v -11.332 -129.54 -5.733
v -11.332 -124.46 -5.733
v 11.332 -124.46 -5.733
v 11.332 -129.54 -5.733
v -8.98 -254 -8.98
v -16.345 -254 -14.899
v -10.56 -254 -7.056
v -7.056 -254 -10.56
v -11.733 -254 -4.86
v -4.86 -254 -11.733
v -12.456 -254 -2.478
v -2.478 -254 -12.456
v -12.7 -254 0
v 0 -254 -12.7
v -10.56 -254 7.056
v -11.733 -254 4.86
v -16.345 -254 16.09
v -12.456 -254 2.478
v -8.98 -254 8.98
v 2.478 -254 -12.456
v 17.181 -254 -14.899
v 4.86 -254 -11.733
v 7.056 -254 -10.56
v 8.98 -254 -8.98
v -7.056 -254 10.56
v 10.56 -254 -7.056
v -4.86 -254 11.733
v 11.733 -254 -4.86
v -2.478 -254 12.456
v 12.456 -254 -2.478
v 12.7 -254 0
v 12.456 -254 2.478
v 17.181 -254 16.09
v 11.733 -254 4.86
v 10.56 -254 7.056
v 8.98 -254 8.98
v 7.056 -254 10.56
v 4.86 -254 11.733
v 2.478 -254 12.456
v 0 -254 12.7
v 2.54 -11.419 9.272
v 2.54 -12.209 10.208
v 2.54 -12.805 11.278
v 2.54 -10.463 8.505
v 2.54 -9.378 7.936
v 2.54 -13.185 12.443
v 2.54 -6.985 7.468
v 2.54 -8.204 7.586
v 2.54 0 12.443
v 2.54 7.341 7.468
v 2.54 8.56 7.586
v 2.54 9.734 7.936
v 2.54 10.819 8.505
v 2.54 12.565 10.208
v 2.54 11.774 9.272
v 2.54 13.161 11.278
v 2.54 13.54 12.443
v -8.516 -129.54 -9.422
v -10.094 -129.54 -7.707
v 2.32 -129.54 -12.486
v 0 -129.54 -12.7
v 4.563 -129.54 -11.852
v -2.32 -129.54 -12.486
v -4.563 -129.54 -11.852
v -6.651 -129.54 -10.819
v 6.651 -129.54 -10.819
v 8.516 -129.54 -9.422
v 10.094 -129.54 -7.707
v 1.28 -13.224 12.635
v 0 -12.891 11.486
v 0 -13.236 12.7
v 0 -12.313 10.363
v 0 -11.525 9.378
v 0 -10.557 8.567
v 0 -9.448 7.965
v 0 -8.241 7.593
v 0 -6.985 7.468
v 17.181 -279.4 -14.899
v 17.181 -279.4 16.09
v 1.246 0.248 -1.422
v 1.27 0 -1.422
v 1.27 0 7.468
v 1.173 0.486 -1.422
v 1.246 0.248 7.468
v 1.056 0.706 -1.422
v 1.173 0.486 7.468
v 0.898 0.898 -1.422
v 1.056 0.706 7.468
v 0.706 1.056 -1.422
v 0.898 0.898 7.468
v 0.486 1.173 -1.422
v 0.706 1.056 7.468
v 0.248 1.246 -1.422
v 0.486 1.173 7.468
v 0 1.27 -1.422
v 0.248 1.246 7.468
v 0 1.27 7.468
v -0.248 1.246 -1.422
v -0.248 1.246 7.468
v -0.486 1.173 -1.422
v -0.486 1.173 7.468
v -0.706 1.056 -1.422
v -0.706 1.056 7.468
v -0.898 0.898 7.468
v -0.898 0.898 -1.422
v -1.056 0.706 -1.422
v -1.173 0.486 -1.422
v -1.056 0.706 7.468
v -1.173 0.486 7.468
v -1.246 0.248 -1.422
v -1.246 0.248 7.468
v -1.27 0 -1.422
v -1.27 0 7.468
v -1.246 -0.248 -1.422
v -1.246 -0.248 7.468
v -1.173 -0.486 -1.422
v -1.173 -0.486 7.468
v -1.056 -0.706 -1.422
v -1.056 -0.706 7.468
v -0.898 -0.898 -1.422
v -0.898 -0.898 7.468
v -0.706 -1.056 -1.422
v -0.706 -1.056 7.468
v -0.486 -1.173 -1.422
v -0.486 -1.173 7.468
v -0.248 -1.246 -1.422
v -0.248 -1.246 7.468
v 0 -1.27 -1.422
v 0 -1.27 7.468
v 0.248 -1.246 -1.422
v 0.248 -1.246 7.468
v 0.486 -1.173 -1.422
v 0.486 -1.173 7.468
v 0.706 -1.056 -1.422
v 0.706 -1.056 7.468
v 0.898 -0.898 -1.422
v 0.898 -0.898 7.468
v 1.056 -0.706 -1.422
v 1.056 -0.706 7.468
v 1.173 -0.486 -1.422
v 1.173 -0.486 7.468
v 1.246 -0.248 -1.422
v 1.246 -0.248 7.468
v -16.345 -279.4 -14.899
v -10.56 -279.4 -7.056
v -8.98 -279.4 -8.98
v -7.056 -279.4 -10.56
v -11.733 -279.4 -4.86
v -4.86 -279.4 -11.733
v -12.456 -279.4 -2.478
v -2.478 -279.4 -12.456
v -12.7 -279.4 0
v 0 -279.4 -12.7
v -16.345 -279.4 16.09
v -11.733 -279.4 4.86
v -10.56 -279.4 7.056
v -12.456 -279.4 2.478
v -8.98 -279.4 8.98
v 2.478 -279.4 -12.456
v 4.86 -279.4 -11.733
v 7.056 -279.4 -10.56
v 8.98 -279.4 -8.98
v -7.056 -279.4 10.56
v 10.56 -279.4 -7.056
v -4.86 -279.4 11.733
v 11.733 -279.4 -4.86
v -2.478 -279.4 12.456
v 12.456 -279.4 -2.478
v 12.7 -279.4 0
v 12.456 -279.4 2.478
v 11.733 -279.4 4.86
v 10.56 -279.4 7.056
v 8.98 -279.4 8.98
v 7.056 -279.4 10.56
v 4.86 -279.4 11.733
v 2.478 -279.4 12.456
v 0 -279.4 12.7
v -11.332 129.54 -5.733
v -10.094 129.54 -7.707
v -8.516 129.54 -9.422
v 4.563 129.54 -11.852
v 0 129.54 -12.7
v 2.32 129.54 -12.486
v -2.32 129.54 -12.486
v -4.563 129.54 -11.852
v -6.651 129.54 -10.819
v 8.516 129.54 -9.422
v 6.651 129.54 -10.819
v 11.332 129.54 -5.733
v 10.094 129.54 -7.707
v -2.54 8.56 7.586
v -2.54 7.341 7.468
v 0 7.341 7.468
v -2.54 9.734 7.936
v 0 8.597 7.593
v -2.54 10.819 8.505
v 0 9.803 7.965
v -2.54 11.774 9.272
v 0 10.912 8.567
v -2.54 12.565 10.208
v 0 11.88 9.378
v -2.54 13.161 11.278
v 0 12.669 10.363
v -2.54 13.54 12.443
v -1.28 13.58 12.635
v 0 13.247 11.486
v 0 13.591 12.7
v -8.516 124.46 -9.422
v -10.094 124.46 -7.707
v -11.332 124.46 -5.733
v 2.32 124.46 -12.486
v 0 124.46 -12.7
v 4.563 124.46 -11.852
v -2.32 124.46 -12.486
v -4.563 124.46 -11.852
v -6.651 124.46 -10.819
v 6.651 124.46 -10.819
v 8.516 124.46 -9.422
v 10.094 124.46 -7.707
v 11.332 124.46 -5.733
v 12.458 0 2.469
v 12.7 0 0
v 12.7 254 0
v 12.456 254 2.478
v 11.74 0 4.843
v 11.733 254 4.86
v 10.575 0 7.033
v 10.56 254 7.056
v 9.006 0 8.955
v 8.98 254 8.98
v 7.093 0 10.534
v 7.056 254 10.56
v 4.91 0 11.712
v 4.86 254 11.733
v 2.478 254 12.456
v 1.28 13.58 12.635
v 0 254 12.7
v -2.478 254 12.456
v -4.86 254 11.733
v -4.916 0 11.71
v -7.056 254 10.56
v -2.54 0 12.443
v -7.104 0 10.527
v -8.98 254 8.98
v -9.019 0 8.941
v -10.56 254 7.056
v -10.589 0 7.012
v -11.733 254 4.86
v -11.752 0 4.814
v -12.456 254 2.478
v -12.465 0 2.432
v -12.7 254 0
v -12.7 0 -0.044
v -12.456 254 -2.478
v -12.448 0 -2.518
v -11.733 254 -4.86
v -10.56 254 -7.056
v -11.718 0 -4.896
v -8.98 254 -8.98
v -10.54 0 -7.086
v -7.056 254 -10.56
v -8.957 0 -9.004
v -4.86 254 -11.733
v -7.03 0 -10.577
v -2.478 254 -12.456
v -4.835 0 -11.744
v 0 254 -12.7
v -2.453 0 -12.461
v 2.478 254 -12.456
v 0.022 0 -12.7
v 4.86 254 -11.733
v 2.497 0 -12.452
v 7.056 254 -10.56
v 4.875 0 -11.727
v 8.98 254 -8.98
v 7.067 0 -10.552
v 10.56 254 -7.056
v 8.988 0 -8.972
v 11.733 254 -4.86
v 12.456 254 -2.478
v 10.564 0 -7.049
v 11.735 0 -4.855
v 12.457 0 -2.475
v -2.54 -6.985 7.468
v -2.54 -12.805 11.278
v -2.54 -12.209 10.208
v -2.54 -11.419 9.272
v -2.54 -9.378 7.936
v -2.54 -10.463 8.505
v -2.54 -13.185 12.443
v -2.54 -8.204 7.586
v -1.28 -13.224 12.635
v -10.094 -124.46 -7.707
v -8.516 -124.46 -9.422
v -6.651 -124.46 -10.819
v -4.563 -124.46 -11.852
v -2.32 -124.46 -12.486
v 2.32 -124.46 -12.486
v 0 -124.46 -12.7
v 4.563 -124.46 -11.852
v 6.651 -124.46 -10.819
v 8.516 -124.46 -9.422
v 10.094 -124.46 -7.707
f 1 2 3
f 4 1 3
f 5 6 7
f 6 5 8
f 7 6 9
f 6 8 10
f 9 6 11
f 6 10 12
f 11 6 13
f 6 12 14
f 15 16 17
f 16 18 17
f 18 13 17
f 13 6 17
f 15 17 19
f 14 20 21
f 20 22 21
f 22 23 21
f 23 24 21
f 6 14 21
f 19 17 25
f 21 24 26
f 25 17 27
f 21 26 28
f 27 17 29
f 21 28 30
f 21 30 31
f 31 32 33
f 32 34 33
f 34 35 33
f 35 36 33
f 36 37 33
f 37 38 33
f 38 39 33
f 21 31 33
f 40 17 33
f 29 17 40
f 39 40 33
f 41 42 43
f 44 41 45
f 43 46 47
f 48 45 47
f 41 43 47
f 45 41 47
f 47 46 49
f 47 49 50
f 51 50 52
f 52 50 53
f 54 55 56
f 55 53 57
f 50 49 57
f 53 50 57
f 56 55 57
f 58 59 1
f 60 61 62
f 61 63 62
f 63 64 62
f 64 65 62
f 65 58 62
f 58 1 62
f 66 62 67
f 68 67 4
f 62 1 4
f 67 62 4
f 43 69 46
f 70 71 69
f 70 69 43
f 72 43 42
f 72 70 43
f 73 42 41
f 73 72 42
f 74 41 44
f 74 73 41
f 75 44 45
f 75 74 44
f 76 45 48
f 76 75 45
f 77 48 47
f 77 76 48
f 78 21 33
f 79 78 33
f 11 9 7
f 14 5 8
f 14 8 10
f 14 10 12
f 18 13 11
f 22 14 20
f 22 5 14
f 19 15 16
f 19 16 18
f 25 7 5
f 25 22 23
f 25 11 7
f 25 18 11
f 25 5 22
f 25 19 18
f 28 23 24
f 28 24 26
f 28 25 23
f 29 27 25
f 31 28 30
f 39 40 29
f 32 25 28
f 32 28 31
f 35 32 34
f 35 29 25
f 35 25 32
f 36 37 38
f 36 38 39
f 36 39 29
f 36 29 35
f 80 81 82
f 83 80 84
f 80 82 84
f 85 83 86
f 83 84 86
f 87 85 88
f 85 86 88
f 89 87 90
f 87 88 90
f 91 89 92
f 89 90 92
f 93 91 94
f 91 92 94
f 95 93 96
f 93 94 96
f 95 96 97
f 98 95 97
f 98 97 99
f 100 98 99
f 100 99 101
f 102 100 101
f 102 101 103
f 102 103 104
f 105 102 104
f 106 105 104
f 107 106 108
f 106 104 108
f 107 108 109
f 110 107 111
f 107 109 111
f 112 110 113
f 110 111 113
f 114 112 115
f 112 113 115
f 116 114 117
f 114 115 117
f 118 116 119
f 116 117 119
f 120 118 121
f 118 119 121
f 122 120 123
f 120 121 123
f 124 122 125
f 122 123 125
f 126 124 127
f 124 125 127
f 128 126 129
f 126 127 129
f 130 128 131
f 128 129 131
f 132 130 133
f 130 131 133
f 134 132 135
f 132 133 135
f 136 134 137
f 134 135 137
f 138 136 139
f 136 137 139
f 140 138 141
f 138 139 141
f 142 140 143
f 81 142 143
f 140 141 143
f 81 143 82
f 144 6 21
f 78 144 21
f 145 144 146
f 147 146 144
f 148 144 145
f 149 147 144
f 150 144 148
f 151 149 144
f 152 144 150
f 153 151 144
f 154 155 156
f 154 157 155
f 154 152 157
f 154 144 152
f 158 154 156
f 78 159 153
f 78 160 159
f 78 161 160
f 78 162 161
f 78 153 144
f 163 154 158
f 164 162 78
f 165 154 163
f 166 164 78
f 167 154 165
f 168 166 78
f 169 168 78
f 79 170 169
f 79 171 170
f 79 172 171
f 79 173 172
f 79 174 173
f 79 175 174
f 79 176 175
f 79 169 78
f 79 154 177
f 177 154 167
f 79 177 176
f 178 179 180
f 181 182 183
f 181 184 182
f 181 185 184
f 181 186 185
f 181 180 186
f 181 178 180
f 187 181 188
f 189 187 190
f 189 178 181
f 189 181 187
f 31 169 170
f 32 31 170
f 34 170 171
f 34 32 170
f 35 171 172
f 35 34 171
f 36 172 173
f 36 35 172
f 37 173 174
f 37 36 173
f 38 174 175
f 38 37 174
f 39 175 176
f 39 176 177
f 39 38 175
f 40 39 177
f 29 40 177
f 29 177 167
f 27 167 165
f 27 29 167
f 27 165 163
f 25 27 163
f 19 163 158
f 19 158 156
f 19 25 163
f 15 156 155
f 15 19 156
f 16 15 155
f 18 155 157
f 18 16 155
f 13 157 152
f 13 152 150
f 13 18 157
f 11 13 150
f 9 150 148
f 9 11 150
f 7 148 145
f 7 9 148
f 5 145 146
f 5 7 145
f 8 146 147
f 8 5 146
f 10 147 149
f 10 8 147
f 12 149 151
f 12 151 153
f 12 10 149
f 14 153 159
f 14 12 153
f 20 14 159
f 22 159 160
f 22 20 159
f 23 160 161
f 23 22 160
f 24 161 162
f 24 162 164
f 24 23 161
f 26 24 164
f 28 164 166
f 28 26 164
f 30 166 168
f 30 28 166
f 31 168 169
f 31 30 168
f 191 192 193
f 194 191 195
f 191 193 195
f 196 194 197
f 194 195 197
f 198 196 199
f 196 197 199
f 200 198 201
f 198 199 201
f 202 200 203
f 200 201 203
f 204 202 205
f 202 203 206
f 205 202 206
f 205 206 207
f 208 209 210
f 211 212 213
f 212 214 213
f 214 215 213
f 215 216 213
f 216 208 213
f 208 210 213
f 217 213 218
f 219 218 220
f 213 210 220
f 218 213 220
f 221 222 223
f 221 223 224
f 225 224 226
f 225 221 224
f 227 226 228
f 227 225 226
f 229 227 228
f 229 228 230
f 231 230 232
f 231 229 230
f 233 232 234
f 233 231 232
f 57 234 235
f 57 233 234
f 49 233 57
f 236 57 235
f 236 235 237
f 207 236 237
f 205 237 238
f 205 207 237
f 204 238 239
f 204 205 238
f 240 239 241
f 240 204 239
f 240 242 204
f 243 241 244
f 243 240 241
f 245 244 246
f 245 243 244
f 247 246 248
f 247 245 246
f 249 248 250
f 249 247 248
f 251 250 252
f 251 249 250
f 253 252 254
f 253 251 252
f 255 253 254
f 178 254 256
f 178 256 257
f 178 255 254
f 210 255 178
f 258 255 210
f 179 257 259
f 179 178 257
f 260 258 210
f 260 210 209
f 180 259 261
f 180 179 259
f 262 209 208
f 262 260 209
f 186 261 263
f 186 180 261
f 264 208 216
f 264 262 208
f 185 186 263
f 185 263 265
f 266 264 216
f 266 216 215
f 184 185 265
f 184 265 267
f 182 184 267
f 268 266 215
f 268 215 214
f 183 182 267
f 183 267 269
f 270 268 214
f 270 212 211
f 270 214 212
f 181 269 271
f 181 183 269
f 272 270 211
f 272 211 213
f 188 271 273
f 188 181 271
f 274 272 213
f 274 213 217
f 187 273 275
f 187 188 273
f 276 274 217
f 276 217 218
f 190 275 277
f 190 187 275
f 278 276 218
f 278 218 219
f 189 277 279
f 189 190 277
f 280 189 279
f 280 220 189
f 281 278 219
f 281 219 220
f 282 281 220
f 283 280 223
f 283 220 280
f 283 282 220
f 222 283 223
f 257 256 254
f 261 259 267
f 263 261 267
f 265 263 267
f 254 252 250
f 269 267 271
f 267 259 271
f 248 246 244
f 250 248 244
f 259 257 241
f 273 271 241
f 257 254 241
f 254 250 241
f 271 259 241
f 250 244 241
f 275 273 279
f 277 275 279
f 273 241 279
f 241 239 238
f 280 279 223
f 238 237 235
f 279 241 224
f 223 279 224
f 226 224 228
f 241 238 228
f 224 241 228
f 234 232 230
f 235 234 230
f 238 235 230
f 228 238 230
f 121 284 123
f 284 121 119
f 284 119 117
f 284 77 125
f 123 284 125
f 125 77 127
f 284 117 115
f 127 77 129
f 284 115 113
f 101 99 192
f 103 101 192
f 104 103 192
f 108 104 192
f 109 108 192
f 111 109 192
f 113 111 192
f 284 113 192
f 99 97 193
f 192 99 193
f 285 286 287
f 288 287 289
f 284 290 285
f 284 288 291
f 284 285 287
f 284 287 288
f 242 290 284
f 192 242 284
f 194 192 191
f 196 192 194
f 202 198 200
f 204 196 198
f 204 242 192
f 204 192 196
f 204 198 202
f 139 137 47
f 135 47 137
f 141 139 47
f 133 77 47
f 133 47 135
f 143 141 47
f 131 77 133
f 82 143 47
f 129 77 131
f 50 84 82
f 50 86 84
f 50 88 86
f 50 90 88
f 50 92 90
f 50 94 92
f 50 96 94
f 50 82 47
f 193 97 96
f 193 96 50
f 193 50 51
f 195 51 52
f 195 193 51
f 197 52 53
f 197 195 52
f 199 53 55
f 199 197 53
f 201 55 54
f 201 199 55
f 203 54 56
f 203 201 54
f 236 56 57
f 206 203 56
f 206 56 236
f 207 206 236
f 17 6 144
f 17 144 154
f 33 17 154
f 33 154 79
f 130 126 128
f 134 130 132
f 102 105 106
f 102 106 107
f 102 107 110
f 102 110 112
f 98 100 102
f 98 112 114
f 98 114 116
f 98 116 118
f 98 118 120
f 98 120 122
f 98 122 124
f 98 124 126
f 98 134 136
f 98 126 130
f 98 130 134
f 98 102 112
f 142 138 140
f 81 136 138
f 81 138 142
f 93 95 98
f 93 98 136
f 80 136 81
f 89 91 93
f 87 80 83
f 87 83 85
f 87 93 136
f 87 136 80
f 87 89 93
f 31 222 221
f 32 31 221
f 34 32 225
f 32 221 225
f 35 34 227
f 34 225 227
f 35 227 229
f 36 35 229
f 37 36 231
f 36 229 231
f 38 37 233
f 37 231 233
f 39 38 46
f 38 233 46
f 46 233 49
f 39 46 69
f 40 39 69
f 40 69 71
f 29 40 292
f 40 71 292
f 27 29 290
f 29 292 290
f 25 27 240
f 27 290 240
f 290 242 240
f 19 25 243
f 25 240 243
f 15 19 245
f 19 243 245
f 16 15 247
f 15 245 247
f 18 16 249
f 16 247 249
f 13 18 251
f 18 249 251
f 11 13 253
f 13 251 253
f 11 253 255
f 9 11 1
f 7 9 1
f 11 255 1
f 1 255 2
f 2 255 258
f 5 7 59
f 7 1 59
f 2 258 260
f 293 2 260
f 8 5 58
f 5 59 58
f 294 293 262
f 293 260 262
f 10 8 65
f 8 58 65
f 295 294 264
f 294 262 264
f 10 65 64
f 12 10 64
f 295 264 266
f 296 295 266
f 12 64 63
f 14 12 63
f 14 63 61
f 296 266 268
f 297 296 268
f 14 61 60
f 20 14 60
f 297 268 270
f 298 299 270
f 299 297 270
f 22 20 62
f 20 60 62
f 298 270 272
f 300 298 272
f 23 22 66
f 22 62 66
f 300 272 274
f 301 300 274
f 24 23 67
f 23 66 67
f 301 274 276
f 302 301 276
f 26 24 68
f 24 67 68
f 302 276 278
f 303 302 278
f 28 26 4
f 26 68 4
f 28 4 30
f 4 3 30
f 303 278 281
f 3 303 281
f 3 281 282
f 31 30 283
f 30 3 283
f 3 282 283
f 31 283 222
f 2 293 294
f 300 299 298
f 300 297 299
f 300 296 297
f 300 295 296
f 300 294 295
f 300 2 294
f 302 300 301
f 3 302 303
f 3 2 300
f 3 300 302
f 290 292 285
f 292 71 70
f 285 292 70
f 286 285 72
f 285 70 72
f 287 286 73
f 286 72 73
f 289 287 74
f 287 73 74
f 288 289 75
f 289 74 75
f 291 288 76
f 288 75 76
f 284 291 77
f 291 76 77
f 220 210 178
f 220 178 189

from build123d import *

# Parameters (mm, degrees)
F0_R          = 12.7
F1_DEPTH      = 254
F3_W          = 37.01931
F3_H          = 8.172032
F4_DEPTH      = 2.54
F4_DEPTH_BACK = 2.54
F7_DEPTH      = 2.54
F7_DEPTH_BACK = 2.54
F8_R          = 1.27
F9_DEPTH      = 8.89
F11_W         = 33.526458
F11_H         = 30.989028
F11_R         = 12.7
F12_DEPTH     = 25.4


with BuildPart() as f1:
    # F0 (on Front) → F1 (new body)
    with BuildSketch(Plane.XZ):
        Circle(F0_R)
    extrude(amount=F1_DEPTH)

    # F3 (on offset) → F4 (cut, two sides)
    with BuildSketch(Plane.XZ.offset(127)) as f4_sk:
        with Locations((0.839331, -9.819486)):
            Rectangle(F3_W, F3_H)
    extrude(amount=F4_DEPTH, mode=Mode.SUBTRACT)
    extrude(f4_sk.sketch, amount=-F4_DEPTH_BACK, mode=Mode.SUBTRACT)

    # F5: F1 across plane


with BuildPart() as f1_1:
    add(f1.part)
    add(f1.part.mirror(Plane.XZ))

    # F6 (on Right) → F7 (cut, two sides)
    with BuildSketch(Plane.YZ) as f7_sk:
        with BuildLine():
            Line((13.690605, 19.2024), (-13.335001, 19.2024))
            Line((-13.335001, 19.2024), (-13.335001, 13.8176))
            ThreePointArc((-13.335001, 13.8176), (-11.475129, 9.327472), (-6.985001, 7.4676))
            Line((-6.985001, 7.4676), (7.340605, 7.4676))
            ThreePointArc((7.340605, 7.4676), (11.830733, 9.327472), (13.690605, 13.8176))
            Line((13.690605, 13.8176), (13.690605, 19.2024))
        make_face()
    extrude(amount=F7_DEPTH, mode=Mode.SUBTRACT)
    extrude(f7_sk.sketch, amount=-F7_DEPTH_BACK, mode=Mode.SUBTRACT)

    # F8 (on face) → F9 (cut)
    with BuildSketch(Plane.XY.offset(7.4676)):
        Circle(F8_R)
    extrude(amount=-F9_DEPTH, mode=Mode.SUBTRACT)


with BuildPart() as f12:
    # F11 (on face) → F12 (new body)
    with BuildSketch(Plane.XZ.offset(254)):
        with Locations((0.417737, 0.595393)):
            Rectangle(F11_W, F11_H)
        Circle(F11_R, mode=Mode.SUBTRACT)
    extrude(amount=F12_DEPTH)


solid = Compound([f1_1.part, f12.part])
